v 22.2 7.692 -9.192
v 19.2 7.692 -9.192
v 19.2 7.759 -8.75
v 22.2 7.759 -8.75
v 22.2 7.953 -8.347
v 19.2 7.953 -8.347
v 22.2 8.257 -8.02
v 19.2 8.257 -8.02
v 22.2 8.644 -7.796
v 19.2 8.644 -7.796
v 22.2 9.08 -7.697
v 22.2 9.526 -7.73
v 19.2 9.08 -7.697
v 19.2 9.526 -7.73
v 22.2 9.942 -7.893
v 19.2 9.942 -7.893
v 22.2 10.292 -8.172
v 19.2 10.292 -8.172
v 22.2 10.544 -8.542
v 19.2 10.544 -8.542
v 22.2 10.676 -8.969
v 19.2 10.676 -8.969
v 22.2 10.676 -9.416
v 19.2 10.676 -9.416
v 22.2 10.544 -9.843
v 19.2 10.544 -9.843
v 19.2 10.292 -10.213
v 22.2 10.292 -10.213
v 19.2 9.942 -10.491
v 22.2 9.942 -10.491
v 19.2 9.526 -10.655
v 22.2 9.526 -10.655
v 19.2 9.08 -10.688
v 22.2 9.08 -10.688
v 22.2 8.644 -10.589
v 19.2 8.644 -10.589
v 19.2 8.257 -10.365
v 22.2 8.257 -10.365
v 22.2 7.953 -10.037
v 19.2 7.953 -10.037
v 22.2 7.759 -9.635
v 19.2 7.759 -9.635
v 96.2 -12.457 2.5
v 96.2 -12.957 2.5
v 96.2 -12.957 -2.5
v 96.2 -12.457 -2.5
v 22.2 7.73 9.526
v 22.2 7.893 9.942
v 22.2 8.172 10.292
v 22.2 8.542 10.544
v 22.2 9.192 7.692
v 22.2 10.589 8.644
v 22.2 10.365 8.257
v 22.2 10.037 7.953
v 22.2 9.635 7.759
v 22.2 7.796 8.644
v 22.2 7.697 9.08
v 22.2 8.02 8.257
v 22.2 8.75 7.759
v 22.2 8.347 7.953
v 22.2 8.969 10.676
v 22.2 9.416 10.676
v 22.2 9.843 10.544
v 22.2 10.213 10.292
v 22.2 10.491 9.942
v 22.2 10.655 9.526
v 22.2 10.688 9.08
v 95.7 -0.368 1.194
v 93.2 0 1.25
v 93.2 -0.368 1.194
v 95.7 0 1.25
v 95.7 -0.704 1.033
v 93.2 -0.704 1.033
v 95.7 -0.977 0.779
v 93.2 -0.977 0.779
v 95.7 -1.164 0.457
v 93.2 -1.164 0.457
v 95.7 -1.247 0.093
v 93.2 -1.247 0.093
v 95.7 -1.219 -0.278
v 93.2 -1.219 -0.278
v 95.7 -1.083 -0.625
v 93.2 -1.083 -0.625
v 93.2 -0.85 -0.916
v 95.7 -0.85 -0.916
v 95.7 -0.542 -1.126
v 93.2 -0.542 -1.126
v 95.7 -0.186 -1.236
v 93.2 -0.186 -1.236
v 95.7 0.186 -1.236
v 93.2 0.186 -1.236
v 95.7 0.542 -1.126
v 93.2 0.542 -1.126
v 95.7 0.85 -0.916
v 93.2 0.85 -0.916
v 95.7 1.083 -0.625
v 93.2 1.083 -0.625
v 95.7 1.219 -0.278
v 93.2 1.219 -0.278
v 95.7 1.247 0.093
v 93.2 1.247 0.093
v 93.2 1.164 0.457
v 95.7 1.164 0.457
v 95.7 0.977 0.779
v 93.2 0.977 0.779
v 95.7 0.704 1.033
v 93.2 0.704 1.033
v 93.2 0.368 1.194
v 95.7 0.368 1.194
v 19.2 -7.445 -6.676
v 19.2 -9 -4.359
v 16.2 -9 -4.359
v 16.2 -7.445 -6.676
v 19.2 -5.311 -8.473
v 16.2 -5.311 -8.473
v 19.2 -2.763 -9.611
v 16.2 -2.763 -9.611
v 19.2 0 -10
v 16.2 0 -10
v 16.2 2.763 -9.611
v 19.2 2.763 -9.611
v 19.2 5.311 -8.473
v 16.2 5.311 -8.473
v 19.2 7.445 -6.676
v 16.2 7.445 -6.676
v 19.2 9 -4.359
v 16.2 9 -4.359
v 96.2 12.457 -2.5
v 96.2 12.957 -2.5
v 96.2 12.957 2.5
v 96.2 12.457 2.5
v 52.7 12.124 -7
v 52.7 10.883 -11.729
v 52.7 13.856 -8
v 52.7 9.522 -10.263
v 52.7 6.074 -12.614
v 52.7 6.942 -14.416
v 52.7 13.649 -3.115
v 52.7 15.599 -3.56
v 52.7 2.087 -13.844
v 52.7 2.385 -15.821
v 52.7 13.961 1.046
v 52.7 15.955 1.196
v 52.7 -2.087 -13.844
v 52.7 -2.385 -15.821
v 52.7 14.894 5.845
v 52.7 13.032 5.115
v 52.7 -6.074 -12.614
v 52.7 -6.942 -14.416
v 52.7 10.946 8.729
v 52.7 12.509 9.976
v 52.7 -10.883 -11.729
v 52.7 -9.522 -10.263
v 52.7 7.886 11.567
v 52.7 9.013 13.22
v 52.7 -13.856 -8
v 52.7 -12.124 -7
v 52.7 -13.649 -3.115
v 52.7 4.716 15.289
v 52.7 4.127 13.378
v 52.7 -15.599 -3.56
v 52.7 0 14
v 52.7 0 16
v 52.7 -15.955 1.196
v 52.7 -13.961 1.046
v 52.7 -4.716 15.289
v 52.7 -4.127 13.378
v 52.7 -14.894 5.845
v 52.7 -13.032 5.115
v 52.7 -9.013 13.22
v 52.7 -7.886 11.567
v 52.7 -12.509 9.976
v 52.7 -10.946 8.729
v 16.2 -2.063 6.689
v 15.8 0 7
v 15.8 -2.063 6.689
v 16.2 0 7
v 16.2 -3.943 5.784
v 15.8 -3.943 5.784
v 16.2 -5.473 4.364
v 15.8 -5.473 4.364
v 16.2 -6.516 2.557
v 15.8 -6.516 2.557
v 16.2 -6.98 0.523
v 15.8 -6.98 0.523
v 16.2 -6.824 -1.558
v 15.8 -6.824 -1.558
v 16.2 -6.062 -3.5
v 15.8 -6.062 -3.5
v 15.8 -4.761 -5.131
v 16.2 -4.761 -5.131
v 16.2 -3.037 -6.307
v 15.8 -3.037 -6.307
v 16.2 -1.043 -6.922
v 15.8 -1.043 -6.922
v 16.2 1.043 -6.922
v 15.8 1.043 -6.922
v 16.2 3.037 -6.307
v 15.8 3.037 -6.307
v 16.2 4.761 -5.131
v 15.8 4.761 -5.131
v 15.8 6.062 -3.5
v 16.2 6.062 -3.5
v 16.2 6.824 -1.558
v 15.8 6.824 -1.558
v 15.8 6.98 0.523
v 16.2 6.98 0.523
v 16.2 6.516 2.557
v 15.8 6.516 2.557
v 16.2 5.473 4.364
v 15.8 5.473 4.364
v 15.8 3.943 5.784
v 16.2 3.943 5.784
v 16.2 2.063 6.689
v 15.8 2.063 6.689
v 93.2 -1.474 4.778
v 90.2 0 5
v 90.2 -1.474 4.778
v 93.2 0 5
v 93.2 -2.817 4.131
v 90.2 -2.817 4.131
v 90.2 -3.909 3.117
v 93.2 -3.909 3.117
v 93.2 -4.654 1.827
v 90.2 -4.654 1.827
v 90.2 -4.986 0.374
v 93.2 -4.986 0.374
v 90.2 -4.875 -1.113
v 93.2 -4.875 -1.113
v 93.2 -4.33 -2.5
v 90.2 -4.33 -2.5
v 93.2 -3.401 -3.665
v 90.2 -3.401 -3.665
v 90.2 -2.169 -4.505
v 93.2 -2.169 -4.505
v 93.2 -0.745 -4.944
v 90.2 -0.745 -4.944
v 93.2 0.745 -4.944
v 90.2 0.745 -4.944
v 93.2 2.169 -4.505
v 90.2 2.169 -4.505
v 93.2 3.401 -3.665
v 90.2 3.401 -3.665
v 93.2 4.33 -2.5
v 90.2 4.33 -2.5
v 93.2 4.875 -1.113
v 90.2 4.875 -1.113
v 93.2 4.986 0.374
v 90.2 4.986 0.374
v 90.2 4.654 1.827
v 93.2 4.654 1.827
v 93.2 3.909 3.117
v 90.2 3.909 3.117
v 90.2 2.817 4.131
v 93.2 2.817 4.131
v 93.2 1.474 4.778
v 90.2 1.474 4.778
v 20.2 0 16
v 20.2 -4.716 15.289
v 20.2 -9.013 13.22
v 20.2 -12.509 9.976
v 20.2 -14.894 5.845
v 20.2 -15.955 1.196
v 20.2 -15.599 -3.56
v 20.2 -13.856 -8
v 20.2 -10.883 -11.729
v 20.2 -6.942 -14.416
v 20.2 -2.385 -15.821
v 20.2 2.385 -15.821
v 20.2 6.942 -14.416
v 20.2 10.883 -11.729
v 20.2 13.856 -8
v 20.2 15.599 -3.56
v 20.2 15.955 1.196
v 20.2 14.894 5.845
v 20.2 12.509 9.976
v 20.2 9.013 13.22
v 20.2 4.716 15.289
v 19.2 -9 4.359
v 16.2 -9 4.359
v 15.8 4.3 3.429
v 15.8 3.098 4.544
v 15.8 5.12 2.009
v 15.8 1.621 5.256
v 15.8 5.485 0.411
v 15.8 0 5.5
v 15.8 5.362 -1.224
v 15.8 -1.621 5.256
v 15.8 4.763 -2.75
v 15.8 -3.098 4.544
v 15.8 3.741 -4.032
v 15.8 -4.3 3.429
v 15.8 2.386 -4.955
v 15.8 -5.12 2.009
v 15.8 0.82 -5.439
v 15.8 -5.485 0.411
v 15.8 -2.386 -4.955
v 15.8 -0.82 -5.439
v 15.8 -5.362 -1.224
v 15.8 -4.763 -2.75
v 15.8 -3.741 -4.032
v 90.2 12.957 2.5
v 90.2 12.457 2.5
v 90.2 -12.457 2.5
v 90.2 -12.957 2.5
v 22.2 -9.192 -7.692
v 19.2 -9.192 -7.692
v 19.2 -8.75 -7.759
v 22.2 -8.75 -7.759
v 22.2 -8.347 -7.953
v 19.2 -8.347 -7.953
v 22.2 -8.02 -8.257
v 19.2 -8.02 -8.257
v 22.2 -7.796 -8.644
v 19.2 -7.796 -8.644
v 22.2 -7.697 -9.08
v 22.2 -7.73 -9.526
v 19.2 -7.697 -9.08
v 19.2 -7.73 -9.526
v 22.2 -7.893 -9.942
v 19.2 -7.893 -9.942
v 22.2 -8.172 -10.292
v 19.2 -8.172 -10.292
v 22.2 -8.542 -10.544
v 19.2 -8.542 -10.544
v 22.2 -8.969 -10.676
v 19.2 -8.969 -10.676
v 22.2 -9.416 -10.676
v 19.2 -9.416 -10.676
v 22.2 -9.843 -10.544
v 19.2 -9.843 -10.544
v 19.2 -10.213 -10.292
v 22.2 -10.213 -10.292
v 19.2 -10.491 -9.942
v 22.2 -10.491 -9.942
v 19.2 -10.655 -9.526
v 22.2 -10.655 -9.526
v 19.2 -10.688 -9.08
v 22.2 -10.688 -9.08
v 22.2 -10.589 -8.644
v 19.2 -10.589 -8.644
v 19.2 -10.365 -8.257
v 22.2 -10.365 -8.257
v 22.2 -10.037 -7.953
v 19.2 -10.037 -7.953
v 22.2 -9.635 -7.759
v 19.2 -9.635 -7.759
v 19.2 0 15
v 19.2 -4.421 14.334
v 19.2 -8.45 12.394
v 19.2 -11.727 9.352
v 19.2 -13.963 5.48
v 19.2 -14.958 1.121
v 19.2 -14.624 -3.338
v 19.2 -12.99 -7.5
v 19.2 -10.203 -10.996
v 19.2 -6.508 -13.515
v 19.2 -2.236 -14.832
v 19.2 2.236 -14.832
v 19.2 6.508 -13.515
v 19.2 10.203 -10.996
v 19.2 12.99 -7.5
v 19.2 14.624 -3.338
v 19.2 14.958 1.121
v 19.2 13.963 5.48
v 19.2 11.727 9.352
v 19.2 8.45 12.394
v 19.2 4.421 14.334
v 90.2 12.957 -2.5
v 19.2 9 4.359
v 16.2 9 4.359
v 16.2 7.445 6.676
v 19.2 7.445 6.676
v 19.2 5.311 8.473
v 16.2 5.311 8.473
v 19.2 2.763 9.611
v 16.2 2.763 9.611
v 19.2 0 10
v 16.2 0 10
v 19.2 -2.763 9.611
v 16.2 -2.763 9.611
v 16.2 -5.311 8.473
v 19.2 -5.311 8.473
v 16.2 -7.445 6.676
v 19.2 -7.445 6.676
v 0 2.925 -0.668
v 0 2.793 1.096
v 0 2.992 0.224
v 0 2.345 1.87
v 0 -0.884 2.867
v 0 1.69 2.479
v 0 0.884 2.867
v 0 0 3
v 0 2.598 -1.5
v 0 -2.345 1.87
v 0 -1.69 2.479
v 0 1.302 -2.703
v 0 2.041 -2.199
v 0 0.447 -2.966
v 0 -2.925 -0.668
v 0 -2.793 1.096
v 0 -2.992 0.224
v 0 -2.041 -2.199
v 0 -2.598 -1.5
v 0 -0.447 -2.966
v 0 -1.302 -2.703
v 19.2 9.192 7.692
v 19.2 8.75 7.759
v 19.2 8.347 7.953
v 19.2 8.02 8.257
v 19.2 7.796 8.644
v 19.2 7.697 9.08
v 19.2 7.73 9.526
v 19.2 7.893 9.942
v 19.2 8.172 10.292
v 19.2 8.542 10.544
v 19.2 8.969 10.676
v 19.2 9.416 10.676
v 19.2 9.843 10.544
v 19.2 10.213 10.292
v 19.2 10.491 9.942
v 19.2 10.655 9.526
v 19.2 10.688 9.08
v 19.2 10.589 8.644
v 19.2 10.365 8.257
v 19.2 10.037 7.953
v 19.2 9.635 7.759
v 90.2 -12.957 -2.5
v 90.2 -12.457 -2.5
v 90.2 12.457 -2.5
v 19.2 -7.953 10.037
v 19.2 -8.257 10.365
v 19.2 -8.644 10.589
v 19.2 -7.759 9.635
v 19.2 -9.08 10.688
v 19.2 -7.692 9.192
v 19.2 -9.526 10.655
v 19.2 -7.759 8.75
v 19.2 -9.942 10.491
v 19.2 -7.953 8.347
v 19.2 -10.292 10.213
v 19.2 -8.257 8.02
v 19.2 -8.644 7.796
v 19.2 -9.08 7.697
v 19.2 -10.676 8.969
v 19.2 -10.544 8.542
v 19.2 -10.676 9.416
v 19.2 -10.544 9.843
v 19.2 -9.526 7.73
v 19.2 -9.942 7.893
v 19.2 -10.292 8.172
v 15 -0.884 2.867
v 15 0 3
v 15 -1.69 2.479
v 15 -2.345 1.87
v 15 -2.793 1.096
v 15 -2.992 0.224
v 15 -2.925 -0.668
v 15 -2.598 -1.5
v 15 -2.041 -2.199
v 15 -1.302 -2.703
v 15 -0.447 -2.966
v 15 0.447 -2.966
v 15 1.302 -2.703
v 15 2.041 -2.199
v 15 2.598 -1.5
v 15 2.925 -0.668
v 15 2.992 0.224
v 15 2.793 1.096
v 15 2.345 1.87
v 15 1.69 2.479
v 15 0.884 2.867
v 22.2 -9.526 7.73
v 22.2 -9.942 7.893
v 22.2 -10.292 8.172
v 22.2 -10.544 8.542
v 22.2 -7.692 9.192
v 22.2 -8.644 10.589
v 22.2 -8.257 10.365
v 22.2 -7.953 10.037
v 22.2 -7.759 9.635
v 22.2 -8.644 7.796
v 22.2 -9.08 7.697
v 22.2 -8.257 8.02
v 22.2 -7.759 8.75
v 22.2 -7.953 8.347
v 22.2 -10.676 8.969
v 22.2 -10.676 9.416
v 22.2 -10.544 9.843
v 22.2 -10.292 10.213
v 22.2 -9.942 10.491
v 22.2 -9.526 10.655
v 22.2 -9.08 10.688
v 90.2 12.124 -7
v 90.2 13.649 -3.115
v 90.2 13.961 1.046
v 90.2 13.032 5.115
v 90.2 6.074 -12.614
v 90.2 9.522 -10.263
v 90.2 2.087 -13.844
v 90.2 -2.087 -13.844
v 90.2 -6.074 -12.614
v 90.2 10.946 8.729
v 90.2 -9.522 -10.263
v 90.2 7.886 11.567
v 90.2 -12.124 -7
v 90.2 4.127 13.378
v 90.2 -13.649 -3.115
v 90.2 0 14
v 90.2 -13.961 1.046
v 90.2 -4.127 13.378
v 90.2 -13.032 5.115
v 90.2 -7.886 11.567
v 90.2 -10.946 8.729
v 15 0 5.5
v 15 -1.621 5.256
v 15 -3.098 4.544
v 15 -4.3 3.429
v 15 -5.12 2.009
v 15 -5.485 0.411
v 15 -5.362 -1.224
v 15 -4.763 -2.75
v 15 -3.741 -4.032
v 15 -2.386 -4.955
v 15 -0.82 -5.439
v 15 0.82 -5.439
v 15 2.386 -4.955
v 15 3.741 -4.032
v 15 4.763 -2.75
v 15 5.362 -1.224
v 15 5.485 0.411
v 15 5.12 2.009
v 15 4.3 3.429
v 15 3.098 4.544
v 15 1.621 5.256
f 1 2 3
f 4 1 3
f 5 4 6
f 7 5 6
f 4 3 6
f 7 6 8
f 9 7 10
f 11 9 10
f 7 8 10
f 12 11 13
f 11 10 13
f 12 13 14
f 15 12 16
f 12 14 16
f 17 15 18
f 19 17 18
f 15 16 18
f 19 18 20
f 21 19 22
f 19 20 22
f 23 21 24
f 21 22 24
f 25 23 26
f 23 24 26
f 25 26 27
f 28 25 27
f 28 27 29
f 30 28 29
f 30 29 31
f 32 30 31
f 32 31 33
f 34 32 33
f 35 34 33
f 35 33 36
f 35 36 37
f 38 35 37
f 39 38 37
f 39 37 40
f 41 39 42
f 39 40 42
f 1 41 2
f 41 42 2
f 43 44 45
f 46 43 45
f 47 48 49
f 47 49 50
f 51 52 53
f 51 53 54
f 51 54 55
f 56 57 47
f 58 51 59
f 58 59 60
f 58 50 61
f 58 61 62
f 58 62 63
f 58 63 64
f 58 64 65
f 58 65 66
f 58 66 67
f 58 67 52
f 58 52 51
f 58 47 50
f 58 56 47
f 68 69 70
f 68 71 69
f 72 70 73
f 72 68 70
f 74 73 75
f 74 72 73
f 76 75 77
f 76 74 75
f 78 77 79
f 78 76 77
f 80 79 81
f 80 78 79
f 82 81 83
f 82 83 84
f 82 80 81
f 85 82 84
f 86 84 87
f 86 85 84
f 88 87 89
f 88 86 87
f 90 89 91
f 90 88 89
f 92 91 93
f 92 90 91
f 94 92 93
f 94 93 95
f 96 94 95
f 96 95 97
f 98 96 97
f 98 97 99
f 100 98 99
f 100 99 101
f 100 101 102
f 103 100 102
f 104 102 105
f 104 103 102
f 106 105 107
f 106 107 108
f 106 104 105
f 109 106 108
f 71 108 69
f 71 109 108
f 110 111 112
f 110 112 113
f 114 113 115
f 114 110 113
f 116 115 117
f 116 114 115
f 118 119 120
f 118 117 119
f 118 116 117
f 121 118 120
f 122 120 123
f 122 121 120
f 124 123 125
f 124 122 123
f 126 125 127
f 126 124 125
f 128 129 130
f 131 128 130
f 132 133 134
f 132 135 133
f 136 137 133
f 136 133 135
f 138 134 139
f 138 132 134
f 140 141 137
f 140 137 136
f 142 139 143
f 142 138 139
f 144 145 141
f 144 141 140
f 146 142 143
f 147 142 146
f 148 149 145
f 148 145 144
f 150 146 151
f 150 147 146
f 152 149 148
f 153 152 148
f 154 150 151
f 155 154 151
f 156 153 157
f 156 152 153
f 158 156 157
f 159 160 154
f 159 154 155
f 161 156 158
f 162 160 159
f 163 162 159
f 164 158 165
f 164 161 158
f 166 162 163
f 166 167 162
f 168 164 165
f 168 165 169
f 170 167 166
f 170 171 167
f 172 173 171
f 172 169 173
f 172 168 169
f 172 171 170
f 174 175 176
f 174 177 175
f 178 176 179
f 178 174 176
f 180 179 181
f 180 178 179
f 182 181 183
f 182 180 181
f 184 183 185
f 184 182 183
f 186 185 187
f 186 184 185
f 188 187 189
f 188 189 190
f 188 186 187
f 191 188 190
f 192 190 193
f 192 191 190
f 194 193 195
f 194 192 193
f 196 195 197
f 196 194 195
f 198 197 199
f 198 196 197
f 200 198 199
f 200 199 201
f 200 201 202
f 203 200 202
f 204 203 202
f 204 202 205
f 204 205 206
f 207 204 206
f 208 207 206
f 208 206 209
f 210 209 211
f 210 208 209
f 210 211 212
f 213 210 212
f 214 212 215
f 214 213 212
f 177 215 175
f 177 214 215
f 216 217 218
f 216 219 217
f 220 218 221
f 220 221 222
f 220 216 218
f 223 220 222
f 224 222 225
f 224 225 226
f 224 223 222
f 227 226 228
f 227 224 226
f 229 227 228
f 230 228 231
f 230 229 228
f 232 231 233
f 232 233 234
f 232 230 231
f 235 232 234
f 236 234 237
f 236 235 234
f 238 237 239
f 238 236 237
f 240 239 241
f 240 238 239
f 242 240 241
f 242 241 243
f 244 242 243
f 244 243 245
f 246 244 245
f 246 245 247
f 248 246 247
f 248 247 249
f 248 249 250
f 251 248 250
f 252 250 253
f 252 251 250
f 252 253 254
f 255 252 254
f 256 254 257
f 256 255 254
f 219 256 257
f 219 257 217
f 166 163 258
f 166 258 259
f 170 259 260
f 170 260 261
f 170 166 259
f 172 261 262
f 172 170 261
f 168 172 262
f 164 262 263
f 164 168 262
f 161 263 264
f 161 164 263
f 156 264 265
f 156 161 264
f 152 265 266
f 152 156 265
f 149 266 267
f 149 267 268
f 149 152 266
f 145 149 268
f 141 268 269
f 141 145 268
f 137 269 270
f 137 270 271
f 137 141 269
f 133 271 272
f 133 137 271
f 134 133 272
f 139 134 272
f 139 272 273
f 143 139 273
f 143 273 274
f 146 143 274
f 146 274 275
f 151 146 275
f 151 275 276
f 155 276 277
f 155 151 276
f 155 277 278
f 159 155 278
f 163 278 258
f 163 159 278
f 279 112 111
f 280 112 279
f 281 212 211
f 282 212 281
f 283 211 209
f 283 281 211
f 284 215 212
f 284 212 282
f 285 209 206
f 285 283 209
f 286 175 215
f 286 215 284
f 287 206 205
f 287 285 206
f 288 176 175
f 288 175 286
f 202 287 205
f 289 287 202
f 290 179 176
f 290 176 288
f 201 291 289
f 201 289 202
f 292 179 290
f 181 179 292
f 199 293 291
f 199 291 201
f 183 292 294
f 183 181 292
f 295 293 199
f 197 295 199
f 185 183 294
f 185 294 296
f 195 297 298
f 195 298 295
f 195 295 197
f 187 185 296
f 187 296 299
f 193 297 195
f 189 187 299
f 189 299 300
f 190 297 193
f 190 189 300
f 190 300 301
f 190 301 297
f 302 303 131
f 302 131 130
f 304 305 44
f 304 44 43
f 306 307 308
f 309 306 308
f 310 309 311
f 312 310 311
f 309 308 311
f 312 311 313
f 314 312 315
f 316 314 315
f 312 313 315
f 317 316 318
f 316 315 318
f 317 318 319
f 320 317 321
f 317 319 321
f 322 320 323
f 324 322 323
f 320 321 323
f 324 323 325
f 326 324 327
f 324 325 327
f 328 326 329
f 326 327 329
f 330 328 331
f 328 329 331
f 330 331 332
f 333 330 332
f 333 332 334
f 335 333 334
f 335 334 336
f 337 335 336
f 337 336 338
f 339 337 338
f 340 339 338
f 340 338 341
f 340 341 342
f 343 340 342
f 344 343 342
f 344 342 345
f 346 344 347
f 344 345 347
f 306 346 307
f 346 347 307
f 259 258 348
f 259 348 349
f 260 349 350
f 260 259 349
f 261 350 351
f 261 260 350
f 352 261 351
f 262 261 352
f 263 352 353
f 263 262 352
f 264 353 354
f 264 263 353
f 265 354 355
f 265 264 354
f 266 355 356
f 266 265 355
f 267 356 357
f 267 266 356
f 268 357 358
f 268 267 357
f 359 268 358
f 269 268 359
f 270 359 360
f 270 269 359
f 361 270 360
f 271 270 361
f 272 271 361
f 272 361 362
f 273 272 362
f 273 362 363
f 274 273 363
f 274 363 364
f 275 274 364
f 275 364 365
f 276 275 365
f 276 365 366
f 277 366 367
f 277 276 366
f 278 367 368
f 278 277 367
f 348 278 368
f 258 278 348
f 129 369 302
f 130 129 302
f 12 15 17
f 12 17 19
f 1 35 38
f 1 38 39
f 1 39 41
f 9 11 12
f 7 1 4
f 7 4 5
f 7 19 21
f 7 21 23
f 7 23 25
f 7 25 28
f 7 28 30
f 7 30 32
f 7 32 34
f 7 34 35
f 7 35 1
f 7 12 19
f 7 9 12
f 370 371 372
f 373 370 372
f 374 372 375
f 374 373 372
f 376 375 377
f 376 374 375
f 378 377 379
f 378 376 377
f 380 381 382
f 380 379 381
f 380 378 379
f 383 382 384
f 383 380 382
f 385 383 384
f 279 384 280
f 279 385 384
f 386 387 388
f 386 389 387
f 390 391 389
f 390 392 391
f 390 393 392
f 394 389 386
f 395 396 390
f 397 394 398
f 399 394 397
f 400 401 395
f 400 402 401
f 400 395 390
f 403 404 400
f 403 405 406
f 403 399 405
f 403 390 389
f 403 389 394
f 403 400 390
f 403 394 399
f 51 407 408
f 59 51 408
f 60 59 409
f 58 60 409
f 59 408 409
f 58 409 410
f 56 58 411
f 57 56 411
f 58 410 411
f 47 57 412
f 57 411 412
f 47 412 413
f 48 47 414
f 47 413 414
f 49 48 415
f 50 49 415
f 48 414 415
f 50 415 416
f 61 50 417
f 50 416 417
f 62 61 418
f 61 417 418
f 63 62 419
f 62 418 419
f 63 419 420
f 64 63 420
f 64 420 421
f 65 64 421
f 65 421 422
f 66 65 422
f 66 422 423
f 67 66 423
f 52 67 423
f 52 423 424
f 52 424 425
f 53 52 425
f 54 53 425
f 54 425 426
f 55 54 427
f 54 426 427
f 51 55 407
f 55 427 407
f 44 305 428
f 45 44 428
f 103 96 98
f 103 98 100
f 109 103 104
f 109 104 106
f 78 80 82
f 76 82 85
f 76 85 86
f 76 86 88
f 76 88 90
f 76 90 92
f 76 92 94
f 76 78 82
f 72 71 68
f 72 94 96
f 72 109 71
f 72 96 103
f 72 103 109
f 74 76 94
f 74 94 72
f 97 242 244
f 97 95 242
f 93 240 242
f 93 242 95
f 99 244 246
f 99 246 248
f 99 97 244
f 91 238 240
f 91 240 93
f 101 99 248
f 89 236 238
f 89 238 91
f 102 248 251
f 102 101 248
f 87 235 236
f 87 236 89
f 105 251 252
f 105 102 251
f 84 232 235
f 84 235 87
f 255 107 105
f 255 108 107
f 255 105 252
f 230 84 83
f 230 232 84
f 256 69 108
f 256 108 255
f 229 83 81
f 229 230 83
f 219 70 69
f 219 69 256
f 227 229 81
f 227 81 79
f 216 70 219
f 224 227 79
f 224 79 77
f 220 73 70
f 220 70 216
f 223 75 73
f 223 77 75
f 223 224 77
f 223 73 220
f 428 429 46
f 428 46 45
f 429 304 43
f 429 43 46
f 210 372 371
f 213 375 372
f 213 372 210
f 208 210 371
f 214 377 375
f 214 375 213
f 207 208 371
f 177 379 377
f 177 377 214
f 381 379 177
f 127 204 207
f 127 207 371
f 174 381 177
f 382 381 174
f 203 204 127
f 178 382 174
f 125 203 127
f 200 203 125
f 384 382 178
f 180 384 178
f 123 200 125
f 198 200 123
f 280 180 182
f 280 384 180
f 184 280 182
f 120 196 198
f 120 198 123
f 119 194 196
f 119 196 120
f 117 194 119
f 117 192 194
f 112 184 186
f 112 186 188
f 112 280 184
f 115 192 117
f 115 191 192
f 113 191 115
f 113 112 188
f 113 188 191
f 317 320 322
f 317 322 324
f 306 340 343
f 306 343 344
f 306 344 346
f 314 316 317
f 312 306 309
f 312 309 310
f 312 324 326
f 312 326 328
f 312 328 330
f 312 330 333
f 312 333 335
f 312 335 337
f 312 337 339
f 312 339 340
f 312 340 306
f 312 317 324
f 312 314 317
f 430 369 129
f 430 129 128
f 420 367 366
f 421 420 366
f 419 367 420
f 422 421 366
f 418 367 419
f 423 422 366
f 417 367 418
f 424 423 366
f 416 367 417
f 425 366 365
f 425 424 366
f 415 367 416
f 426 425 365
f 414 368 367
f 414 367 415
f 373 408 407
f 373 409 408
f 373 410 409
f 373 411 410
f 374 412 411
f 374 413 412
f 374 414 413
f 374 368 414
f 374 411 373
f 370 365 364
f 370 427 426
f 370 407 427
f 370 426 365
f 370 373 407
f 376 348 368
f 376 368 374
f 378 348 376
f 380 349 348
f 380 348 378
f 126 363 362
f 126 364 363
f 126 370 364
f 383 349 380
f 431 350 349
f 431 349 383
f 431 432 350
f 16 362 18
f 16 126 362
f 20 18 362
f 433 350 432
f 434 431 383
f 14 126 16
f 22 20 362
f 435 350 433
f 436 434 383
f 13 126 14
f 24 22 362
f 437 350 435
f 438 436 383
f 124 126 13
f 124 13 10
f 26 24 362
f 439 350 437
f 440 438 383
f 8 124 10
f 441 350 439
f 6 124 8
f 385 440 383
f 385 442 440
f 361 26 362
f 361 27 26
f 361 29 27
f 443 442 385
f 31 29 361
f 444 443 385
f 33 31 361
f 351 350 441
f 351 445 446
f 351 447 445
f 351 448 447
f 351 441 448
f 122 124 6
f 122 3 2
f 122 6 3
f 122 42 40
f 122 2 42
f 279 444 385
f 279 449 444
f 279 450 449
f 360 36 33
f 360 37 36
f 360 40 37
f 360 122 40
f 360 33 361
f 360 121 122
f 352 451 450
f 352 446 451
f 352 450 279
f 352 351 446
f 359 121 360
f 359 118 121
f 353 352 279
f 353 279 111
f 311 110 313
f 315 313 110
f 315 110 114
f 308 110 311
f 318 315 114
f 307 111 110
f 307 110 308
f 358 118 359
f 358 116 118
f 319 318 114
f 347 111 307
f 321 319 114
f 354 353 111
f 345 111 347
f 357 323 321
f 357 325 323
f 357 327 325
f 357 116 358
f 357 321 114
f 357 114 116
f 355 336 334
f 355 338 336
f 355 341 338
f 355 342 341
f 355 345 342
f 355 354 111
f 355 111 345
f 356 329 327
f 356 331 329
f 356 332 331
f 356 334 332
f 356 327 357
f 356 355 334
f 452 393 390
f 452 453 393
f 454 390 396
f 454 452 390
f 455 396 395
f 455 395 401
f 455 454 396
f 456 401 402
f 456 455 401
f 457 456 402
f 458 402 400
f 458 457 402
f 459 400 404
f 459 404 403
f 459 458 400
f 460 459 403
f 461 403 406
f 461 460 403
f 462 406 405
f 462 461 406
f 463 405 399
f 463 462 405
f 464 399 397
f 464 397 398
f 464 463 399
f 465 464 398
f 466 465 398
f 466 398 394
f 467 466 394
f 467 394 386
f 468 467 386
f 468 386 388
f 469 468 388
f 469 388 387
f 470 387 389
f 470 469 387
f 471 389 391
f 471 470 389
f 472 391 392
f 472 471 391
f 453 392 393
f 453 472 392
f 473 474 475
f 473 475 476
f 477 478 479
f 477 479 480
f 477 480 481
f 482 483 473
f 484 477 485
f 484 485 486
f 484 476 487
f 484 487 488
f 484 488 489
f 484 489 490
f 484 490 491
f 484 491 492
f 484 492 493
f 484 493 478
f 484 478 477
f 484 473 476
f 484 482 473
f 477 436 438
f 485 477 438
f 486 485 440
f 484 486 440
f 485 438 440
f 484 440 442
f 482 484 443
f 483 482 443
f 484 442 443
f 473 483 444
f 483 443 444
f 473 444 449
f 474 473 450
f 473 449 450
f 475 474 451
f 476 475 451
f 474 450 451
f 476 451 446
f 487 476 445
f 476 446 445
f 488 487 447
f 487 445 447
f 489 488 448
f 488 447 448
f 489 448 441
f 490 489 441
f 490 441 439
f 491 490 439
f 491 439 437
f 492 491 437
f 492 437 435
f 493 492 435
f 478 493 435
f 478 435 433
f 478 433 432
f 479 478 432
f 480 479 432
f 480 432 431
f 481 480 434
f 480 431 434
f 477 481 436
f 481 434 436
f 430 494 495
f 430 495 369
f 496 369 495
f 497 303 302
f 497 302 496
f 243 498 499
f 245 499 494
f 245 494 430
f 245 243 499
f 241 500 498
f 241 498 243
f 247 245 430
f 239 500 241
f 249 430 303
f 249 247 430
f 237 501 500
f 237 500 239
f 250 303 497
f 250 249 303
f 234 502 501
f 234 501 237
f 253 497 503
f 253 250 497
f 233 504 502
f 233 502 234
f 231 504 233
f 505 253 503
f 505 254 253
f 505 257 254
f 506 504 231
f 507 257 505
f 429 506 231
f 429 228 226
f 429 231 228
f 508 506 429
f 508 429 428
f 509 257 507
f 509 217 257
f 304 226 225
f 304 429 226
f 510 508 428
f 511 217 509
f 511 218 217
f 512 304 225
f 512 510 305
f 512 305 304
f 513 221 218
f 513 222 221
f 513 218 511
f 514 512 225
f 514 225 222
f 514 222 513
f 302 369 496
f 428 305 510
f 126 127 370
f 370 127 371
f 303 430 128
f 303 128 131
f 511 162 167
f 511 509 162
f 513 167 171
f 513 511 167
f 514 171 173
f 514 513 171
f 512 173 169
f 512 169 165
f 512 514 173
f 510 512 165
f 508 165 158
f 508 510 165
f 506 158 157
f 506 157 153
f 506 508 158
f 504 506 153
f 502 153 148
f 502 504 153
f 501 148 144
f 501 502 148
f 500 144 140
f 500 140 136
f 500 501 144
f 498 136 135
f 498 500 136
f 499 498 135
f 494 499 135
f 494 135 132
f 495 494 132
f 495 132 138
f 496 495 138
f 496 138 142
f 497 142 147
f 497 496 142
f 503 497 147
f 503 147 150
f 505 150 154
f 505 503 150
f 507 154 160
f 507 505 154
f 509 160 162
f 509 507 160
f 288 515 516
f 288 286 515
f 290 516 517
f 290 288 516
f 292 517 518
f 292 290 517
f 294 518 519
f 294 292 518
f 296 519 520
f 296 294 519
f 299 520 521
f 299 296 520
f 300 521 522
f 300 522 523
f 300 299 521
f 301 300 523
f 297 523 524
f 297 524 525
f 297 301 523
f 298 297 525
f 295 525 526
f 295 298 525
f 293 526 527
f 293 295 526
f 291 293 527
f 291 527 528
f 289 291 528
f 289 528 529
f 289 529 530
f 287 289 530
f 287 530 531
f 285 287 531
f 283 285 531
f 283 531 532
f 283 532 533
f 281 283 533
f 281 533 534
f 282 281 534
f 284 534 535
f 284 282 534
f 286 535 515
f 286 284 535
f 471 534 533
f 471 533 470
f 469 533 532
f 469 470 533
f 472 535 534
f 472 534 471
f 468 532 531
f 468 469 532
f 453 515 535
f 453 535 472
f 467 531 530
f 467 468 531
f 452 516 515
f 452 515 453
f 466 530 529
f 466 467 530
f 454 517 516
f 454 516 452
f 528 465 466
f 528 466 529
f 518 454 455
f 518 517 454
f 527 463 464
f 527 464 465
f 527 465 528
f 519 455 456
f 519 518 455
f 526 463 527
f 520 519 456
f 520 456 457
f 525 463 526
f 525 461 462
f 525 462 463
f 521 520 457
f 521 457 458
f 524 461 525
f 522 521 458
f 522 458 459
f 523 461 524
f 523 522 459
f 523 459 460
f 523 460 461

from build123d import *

# Parameters (mm, degrees)
SKETCH_2_OUTSIDE_W       = 55.172
SKETCH_2_OUTSIDE_H       = 55.172
SKETCH_2_OUTSIDE_W_2     = 20
SKETCH_2_OUTSIDE_H_2     = 18
CUT_EXTRUDE_1_DEPTH      = 3
CHAMFER_1_SIZE           = 1
SKETCH_3_R               = 1.5
CUT_EXTRUDE_3_DEPTH      = 3
PATTERN_CIRCULAR_2_COUNT = 4
EXTRUDE_2_DEPTH          = 6
PATTERN_CIRCULAR_3_COUNT = 2


with BuildPart() as part:
    # ｽｹｯﾁ1 → 回転2 (revolve)
    with BuildSketch(Plane(origin=(0, 0, 0), x_dir=(1, 0, 0), z_dir=(0, 1, 0)), mode=Mode.PRIVATE) as revolve_2_sk:
        Polygon((0, 0), (0, 3), (15, 3), (15, 5.5), (15.8, 5.5), (15.8, 7), (16.2, 7), (16.2, 10), (19.2, 10), (19.2, 16), (52.7, 16), (52.7, 14), (90.2, 14), (90.2, 5), (93.2, 5), (93.2, 1.25), (95.7, 1.25), (95.7, 0), align=None)
    revolve(revolve_2_sk.sketch.rotate(Axis((0, 0, 0), (1, 0, 0)), 180), axis=Axis((0, 0, 0), (1, 0, 0)))

    # ｽｹｯﾁ2 outside → ｶｯﾄ - 押し出し1 (cut)
    with BuildSketch(Plane.ZY.offset(-16.2)):
        Rectangle(SKETCH_2_OUTSIDE_W, SKETCH_2_OUTSIDE_H)
        Rectangle(SKETCH_2_OUTSIDE_W_2, SKETCH_2_OUTSIDE_H_2, mode=Mode.SUBTRACT)
    extrude(amount=-CUT_EXTRUDE_1_DEPTH, mode=Mode.SUBTRACT)

    # 面取り1
    chamfer_1_edges = [part.edges().sort_by_distance(p)[0] for p in [
        (19.2, 0, -16),
    ]]
    chamfer(chamfer_1_edges, length=CHAMFER_1_SIZE)

    # ｽｹｯﾁ3 → ｶｯﾄ - 押し出し3 (cut)
    with BuildSketch(Plane.ZY.offset(-19.2)):
        with Locations((-9.192388155, -9.192388155)):
            Circle(SKETCH_3_R)
    cut_extrude_3 = extrude(amount=-CUT_EXTRUDE_3_DEPTH, mode=Mode.SUBTRACT)

    # 円形ﾊﾟﾀｰﾝ2: ｶｯﾄ - 押し出し3 ×4 about axis
    pattern_circular_2_axis = Axis((0, 0, 0), (1, 0, 0))
    for i in range(1, PATTERN_CIRCULAR_2_COUNT):
        add(cut_extrude_3.rotate(pattern_circular_2_axis, i * 360 / PATTERN_CIRCULAR_2_COUNT), mode=Mode.SUBTRACT)

    # ｽｹｯﾁ4 → ﾎﾞｽ - 押し出し2 (add)
    with BuildSketch(Plane(origin=(90.2, 0, 0), x_dir=(0, 0, -1), z_dir=(1, 0, 0))):
        Polygon((0, 12.956973635), (2.5, 12.956973635), (2.5, 12.456973635), (-2.5, 12.456973635), (-2.5, 12.956973635), align=None)
    extrude_2 = extrude(amount=EXTRUDE_2_DEPTH)

    # 円形ﾊﾟﾀｰﾝ3: ﾎﾞｽ - 押し出し2 ×2 about axis
    pattern_circular_3_axis = Axis((0, 0, 0), (1, 0, 0))
    for i in range(1, PATTERN_CIRCULAR_3_COUNT):
        add(extrude_2.rotate(pattern_circular_3_axis, i * 360 / PATTERN_CIRCULAR_3_COUNT))


solid = part.part
